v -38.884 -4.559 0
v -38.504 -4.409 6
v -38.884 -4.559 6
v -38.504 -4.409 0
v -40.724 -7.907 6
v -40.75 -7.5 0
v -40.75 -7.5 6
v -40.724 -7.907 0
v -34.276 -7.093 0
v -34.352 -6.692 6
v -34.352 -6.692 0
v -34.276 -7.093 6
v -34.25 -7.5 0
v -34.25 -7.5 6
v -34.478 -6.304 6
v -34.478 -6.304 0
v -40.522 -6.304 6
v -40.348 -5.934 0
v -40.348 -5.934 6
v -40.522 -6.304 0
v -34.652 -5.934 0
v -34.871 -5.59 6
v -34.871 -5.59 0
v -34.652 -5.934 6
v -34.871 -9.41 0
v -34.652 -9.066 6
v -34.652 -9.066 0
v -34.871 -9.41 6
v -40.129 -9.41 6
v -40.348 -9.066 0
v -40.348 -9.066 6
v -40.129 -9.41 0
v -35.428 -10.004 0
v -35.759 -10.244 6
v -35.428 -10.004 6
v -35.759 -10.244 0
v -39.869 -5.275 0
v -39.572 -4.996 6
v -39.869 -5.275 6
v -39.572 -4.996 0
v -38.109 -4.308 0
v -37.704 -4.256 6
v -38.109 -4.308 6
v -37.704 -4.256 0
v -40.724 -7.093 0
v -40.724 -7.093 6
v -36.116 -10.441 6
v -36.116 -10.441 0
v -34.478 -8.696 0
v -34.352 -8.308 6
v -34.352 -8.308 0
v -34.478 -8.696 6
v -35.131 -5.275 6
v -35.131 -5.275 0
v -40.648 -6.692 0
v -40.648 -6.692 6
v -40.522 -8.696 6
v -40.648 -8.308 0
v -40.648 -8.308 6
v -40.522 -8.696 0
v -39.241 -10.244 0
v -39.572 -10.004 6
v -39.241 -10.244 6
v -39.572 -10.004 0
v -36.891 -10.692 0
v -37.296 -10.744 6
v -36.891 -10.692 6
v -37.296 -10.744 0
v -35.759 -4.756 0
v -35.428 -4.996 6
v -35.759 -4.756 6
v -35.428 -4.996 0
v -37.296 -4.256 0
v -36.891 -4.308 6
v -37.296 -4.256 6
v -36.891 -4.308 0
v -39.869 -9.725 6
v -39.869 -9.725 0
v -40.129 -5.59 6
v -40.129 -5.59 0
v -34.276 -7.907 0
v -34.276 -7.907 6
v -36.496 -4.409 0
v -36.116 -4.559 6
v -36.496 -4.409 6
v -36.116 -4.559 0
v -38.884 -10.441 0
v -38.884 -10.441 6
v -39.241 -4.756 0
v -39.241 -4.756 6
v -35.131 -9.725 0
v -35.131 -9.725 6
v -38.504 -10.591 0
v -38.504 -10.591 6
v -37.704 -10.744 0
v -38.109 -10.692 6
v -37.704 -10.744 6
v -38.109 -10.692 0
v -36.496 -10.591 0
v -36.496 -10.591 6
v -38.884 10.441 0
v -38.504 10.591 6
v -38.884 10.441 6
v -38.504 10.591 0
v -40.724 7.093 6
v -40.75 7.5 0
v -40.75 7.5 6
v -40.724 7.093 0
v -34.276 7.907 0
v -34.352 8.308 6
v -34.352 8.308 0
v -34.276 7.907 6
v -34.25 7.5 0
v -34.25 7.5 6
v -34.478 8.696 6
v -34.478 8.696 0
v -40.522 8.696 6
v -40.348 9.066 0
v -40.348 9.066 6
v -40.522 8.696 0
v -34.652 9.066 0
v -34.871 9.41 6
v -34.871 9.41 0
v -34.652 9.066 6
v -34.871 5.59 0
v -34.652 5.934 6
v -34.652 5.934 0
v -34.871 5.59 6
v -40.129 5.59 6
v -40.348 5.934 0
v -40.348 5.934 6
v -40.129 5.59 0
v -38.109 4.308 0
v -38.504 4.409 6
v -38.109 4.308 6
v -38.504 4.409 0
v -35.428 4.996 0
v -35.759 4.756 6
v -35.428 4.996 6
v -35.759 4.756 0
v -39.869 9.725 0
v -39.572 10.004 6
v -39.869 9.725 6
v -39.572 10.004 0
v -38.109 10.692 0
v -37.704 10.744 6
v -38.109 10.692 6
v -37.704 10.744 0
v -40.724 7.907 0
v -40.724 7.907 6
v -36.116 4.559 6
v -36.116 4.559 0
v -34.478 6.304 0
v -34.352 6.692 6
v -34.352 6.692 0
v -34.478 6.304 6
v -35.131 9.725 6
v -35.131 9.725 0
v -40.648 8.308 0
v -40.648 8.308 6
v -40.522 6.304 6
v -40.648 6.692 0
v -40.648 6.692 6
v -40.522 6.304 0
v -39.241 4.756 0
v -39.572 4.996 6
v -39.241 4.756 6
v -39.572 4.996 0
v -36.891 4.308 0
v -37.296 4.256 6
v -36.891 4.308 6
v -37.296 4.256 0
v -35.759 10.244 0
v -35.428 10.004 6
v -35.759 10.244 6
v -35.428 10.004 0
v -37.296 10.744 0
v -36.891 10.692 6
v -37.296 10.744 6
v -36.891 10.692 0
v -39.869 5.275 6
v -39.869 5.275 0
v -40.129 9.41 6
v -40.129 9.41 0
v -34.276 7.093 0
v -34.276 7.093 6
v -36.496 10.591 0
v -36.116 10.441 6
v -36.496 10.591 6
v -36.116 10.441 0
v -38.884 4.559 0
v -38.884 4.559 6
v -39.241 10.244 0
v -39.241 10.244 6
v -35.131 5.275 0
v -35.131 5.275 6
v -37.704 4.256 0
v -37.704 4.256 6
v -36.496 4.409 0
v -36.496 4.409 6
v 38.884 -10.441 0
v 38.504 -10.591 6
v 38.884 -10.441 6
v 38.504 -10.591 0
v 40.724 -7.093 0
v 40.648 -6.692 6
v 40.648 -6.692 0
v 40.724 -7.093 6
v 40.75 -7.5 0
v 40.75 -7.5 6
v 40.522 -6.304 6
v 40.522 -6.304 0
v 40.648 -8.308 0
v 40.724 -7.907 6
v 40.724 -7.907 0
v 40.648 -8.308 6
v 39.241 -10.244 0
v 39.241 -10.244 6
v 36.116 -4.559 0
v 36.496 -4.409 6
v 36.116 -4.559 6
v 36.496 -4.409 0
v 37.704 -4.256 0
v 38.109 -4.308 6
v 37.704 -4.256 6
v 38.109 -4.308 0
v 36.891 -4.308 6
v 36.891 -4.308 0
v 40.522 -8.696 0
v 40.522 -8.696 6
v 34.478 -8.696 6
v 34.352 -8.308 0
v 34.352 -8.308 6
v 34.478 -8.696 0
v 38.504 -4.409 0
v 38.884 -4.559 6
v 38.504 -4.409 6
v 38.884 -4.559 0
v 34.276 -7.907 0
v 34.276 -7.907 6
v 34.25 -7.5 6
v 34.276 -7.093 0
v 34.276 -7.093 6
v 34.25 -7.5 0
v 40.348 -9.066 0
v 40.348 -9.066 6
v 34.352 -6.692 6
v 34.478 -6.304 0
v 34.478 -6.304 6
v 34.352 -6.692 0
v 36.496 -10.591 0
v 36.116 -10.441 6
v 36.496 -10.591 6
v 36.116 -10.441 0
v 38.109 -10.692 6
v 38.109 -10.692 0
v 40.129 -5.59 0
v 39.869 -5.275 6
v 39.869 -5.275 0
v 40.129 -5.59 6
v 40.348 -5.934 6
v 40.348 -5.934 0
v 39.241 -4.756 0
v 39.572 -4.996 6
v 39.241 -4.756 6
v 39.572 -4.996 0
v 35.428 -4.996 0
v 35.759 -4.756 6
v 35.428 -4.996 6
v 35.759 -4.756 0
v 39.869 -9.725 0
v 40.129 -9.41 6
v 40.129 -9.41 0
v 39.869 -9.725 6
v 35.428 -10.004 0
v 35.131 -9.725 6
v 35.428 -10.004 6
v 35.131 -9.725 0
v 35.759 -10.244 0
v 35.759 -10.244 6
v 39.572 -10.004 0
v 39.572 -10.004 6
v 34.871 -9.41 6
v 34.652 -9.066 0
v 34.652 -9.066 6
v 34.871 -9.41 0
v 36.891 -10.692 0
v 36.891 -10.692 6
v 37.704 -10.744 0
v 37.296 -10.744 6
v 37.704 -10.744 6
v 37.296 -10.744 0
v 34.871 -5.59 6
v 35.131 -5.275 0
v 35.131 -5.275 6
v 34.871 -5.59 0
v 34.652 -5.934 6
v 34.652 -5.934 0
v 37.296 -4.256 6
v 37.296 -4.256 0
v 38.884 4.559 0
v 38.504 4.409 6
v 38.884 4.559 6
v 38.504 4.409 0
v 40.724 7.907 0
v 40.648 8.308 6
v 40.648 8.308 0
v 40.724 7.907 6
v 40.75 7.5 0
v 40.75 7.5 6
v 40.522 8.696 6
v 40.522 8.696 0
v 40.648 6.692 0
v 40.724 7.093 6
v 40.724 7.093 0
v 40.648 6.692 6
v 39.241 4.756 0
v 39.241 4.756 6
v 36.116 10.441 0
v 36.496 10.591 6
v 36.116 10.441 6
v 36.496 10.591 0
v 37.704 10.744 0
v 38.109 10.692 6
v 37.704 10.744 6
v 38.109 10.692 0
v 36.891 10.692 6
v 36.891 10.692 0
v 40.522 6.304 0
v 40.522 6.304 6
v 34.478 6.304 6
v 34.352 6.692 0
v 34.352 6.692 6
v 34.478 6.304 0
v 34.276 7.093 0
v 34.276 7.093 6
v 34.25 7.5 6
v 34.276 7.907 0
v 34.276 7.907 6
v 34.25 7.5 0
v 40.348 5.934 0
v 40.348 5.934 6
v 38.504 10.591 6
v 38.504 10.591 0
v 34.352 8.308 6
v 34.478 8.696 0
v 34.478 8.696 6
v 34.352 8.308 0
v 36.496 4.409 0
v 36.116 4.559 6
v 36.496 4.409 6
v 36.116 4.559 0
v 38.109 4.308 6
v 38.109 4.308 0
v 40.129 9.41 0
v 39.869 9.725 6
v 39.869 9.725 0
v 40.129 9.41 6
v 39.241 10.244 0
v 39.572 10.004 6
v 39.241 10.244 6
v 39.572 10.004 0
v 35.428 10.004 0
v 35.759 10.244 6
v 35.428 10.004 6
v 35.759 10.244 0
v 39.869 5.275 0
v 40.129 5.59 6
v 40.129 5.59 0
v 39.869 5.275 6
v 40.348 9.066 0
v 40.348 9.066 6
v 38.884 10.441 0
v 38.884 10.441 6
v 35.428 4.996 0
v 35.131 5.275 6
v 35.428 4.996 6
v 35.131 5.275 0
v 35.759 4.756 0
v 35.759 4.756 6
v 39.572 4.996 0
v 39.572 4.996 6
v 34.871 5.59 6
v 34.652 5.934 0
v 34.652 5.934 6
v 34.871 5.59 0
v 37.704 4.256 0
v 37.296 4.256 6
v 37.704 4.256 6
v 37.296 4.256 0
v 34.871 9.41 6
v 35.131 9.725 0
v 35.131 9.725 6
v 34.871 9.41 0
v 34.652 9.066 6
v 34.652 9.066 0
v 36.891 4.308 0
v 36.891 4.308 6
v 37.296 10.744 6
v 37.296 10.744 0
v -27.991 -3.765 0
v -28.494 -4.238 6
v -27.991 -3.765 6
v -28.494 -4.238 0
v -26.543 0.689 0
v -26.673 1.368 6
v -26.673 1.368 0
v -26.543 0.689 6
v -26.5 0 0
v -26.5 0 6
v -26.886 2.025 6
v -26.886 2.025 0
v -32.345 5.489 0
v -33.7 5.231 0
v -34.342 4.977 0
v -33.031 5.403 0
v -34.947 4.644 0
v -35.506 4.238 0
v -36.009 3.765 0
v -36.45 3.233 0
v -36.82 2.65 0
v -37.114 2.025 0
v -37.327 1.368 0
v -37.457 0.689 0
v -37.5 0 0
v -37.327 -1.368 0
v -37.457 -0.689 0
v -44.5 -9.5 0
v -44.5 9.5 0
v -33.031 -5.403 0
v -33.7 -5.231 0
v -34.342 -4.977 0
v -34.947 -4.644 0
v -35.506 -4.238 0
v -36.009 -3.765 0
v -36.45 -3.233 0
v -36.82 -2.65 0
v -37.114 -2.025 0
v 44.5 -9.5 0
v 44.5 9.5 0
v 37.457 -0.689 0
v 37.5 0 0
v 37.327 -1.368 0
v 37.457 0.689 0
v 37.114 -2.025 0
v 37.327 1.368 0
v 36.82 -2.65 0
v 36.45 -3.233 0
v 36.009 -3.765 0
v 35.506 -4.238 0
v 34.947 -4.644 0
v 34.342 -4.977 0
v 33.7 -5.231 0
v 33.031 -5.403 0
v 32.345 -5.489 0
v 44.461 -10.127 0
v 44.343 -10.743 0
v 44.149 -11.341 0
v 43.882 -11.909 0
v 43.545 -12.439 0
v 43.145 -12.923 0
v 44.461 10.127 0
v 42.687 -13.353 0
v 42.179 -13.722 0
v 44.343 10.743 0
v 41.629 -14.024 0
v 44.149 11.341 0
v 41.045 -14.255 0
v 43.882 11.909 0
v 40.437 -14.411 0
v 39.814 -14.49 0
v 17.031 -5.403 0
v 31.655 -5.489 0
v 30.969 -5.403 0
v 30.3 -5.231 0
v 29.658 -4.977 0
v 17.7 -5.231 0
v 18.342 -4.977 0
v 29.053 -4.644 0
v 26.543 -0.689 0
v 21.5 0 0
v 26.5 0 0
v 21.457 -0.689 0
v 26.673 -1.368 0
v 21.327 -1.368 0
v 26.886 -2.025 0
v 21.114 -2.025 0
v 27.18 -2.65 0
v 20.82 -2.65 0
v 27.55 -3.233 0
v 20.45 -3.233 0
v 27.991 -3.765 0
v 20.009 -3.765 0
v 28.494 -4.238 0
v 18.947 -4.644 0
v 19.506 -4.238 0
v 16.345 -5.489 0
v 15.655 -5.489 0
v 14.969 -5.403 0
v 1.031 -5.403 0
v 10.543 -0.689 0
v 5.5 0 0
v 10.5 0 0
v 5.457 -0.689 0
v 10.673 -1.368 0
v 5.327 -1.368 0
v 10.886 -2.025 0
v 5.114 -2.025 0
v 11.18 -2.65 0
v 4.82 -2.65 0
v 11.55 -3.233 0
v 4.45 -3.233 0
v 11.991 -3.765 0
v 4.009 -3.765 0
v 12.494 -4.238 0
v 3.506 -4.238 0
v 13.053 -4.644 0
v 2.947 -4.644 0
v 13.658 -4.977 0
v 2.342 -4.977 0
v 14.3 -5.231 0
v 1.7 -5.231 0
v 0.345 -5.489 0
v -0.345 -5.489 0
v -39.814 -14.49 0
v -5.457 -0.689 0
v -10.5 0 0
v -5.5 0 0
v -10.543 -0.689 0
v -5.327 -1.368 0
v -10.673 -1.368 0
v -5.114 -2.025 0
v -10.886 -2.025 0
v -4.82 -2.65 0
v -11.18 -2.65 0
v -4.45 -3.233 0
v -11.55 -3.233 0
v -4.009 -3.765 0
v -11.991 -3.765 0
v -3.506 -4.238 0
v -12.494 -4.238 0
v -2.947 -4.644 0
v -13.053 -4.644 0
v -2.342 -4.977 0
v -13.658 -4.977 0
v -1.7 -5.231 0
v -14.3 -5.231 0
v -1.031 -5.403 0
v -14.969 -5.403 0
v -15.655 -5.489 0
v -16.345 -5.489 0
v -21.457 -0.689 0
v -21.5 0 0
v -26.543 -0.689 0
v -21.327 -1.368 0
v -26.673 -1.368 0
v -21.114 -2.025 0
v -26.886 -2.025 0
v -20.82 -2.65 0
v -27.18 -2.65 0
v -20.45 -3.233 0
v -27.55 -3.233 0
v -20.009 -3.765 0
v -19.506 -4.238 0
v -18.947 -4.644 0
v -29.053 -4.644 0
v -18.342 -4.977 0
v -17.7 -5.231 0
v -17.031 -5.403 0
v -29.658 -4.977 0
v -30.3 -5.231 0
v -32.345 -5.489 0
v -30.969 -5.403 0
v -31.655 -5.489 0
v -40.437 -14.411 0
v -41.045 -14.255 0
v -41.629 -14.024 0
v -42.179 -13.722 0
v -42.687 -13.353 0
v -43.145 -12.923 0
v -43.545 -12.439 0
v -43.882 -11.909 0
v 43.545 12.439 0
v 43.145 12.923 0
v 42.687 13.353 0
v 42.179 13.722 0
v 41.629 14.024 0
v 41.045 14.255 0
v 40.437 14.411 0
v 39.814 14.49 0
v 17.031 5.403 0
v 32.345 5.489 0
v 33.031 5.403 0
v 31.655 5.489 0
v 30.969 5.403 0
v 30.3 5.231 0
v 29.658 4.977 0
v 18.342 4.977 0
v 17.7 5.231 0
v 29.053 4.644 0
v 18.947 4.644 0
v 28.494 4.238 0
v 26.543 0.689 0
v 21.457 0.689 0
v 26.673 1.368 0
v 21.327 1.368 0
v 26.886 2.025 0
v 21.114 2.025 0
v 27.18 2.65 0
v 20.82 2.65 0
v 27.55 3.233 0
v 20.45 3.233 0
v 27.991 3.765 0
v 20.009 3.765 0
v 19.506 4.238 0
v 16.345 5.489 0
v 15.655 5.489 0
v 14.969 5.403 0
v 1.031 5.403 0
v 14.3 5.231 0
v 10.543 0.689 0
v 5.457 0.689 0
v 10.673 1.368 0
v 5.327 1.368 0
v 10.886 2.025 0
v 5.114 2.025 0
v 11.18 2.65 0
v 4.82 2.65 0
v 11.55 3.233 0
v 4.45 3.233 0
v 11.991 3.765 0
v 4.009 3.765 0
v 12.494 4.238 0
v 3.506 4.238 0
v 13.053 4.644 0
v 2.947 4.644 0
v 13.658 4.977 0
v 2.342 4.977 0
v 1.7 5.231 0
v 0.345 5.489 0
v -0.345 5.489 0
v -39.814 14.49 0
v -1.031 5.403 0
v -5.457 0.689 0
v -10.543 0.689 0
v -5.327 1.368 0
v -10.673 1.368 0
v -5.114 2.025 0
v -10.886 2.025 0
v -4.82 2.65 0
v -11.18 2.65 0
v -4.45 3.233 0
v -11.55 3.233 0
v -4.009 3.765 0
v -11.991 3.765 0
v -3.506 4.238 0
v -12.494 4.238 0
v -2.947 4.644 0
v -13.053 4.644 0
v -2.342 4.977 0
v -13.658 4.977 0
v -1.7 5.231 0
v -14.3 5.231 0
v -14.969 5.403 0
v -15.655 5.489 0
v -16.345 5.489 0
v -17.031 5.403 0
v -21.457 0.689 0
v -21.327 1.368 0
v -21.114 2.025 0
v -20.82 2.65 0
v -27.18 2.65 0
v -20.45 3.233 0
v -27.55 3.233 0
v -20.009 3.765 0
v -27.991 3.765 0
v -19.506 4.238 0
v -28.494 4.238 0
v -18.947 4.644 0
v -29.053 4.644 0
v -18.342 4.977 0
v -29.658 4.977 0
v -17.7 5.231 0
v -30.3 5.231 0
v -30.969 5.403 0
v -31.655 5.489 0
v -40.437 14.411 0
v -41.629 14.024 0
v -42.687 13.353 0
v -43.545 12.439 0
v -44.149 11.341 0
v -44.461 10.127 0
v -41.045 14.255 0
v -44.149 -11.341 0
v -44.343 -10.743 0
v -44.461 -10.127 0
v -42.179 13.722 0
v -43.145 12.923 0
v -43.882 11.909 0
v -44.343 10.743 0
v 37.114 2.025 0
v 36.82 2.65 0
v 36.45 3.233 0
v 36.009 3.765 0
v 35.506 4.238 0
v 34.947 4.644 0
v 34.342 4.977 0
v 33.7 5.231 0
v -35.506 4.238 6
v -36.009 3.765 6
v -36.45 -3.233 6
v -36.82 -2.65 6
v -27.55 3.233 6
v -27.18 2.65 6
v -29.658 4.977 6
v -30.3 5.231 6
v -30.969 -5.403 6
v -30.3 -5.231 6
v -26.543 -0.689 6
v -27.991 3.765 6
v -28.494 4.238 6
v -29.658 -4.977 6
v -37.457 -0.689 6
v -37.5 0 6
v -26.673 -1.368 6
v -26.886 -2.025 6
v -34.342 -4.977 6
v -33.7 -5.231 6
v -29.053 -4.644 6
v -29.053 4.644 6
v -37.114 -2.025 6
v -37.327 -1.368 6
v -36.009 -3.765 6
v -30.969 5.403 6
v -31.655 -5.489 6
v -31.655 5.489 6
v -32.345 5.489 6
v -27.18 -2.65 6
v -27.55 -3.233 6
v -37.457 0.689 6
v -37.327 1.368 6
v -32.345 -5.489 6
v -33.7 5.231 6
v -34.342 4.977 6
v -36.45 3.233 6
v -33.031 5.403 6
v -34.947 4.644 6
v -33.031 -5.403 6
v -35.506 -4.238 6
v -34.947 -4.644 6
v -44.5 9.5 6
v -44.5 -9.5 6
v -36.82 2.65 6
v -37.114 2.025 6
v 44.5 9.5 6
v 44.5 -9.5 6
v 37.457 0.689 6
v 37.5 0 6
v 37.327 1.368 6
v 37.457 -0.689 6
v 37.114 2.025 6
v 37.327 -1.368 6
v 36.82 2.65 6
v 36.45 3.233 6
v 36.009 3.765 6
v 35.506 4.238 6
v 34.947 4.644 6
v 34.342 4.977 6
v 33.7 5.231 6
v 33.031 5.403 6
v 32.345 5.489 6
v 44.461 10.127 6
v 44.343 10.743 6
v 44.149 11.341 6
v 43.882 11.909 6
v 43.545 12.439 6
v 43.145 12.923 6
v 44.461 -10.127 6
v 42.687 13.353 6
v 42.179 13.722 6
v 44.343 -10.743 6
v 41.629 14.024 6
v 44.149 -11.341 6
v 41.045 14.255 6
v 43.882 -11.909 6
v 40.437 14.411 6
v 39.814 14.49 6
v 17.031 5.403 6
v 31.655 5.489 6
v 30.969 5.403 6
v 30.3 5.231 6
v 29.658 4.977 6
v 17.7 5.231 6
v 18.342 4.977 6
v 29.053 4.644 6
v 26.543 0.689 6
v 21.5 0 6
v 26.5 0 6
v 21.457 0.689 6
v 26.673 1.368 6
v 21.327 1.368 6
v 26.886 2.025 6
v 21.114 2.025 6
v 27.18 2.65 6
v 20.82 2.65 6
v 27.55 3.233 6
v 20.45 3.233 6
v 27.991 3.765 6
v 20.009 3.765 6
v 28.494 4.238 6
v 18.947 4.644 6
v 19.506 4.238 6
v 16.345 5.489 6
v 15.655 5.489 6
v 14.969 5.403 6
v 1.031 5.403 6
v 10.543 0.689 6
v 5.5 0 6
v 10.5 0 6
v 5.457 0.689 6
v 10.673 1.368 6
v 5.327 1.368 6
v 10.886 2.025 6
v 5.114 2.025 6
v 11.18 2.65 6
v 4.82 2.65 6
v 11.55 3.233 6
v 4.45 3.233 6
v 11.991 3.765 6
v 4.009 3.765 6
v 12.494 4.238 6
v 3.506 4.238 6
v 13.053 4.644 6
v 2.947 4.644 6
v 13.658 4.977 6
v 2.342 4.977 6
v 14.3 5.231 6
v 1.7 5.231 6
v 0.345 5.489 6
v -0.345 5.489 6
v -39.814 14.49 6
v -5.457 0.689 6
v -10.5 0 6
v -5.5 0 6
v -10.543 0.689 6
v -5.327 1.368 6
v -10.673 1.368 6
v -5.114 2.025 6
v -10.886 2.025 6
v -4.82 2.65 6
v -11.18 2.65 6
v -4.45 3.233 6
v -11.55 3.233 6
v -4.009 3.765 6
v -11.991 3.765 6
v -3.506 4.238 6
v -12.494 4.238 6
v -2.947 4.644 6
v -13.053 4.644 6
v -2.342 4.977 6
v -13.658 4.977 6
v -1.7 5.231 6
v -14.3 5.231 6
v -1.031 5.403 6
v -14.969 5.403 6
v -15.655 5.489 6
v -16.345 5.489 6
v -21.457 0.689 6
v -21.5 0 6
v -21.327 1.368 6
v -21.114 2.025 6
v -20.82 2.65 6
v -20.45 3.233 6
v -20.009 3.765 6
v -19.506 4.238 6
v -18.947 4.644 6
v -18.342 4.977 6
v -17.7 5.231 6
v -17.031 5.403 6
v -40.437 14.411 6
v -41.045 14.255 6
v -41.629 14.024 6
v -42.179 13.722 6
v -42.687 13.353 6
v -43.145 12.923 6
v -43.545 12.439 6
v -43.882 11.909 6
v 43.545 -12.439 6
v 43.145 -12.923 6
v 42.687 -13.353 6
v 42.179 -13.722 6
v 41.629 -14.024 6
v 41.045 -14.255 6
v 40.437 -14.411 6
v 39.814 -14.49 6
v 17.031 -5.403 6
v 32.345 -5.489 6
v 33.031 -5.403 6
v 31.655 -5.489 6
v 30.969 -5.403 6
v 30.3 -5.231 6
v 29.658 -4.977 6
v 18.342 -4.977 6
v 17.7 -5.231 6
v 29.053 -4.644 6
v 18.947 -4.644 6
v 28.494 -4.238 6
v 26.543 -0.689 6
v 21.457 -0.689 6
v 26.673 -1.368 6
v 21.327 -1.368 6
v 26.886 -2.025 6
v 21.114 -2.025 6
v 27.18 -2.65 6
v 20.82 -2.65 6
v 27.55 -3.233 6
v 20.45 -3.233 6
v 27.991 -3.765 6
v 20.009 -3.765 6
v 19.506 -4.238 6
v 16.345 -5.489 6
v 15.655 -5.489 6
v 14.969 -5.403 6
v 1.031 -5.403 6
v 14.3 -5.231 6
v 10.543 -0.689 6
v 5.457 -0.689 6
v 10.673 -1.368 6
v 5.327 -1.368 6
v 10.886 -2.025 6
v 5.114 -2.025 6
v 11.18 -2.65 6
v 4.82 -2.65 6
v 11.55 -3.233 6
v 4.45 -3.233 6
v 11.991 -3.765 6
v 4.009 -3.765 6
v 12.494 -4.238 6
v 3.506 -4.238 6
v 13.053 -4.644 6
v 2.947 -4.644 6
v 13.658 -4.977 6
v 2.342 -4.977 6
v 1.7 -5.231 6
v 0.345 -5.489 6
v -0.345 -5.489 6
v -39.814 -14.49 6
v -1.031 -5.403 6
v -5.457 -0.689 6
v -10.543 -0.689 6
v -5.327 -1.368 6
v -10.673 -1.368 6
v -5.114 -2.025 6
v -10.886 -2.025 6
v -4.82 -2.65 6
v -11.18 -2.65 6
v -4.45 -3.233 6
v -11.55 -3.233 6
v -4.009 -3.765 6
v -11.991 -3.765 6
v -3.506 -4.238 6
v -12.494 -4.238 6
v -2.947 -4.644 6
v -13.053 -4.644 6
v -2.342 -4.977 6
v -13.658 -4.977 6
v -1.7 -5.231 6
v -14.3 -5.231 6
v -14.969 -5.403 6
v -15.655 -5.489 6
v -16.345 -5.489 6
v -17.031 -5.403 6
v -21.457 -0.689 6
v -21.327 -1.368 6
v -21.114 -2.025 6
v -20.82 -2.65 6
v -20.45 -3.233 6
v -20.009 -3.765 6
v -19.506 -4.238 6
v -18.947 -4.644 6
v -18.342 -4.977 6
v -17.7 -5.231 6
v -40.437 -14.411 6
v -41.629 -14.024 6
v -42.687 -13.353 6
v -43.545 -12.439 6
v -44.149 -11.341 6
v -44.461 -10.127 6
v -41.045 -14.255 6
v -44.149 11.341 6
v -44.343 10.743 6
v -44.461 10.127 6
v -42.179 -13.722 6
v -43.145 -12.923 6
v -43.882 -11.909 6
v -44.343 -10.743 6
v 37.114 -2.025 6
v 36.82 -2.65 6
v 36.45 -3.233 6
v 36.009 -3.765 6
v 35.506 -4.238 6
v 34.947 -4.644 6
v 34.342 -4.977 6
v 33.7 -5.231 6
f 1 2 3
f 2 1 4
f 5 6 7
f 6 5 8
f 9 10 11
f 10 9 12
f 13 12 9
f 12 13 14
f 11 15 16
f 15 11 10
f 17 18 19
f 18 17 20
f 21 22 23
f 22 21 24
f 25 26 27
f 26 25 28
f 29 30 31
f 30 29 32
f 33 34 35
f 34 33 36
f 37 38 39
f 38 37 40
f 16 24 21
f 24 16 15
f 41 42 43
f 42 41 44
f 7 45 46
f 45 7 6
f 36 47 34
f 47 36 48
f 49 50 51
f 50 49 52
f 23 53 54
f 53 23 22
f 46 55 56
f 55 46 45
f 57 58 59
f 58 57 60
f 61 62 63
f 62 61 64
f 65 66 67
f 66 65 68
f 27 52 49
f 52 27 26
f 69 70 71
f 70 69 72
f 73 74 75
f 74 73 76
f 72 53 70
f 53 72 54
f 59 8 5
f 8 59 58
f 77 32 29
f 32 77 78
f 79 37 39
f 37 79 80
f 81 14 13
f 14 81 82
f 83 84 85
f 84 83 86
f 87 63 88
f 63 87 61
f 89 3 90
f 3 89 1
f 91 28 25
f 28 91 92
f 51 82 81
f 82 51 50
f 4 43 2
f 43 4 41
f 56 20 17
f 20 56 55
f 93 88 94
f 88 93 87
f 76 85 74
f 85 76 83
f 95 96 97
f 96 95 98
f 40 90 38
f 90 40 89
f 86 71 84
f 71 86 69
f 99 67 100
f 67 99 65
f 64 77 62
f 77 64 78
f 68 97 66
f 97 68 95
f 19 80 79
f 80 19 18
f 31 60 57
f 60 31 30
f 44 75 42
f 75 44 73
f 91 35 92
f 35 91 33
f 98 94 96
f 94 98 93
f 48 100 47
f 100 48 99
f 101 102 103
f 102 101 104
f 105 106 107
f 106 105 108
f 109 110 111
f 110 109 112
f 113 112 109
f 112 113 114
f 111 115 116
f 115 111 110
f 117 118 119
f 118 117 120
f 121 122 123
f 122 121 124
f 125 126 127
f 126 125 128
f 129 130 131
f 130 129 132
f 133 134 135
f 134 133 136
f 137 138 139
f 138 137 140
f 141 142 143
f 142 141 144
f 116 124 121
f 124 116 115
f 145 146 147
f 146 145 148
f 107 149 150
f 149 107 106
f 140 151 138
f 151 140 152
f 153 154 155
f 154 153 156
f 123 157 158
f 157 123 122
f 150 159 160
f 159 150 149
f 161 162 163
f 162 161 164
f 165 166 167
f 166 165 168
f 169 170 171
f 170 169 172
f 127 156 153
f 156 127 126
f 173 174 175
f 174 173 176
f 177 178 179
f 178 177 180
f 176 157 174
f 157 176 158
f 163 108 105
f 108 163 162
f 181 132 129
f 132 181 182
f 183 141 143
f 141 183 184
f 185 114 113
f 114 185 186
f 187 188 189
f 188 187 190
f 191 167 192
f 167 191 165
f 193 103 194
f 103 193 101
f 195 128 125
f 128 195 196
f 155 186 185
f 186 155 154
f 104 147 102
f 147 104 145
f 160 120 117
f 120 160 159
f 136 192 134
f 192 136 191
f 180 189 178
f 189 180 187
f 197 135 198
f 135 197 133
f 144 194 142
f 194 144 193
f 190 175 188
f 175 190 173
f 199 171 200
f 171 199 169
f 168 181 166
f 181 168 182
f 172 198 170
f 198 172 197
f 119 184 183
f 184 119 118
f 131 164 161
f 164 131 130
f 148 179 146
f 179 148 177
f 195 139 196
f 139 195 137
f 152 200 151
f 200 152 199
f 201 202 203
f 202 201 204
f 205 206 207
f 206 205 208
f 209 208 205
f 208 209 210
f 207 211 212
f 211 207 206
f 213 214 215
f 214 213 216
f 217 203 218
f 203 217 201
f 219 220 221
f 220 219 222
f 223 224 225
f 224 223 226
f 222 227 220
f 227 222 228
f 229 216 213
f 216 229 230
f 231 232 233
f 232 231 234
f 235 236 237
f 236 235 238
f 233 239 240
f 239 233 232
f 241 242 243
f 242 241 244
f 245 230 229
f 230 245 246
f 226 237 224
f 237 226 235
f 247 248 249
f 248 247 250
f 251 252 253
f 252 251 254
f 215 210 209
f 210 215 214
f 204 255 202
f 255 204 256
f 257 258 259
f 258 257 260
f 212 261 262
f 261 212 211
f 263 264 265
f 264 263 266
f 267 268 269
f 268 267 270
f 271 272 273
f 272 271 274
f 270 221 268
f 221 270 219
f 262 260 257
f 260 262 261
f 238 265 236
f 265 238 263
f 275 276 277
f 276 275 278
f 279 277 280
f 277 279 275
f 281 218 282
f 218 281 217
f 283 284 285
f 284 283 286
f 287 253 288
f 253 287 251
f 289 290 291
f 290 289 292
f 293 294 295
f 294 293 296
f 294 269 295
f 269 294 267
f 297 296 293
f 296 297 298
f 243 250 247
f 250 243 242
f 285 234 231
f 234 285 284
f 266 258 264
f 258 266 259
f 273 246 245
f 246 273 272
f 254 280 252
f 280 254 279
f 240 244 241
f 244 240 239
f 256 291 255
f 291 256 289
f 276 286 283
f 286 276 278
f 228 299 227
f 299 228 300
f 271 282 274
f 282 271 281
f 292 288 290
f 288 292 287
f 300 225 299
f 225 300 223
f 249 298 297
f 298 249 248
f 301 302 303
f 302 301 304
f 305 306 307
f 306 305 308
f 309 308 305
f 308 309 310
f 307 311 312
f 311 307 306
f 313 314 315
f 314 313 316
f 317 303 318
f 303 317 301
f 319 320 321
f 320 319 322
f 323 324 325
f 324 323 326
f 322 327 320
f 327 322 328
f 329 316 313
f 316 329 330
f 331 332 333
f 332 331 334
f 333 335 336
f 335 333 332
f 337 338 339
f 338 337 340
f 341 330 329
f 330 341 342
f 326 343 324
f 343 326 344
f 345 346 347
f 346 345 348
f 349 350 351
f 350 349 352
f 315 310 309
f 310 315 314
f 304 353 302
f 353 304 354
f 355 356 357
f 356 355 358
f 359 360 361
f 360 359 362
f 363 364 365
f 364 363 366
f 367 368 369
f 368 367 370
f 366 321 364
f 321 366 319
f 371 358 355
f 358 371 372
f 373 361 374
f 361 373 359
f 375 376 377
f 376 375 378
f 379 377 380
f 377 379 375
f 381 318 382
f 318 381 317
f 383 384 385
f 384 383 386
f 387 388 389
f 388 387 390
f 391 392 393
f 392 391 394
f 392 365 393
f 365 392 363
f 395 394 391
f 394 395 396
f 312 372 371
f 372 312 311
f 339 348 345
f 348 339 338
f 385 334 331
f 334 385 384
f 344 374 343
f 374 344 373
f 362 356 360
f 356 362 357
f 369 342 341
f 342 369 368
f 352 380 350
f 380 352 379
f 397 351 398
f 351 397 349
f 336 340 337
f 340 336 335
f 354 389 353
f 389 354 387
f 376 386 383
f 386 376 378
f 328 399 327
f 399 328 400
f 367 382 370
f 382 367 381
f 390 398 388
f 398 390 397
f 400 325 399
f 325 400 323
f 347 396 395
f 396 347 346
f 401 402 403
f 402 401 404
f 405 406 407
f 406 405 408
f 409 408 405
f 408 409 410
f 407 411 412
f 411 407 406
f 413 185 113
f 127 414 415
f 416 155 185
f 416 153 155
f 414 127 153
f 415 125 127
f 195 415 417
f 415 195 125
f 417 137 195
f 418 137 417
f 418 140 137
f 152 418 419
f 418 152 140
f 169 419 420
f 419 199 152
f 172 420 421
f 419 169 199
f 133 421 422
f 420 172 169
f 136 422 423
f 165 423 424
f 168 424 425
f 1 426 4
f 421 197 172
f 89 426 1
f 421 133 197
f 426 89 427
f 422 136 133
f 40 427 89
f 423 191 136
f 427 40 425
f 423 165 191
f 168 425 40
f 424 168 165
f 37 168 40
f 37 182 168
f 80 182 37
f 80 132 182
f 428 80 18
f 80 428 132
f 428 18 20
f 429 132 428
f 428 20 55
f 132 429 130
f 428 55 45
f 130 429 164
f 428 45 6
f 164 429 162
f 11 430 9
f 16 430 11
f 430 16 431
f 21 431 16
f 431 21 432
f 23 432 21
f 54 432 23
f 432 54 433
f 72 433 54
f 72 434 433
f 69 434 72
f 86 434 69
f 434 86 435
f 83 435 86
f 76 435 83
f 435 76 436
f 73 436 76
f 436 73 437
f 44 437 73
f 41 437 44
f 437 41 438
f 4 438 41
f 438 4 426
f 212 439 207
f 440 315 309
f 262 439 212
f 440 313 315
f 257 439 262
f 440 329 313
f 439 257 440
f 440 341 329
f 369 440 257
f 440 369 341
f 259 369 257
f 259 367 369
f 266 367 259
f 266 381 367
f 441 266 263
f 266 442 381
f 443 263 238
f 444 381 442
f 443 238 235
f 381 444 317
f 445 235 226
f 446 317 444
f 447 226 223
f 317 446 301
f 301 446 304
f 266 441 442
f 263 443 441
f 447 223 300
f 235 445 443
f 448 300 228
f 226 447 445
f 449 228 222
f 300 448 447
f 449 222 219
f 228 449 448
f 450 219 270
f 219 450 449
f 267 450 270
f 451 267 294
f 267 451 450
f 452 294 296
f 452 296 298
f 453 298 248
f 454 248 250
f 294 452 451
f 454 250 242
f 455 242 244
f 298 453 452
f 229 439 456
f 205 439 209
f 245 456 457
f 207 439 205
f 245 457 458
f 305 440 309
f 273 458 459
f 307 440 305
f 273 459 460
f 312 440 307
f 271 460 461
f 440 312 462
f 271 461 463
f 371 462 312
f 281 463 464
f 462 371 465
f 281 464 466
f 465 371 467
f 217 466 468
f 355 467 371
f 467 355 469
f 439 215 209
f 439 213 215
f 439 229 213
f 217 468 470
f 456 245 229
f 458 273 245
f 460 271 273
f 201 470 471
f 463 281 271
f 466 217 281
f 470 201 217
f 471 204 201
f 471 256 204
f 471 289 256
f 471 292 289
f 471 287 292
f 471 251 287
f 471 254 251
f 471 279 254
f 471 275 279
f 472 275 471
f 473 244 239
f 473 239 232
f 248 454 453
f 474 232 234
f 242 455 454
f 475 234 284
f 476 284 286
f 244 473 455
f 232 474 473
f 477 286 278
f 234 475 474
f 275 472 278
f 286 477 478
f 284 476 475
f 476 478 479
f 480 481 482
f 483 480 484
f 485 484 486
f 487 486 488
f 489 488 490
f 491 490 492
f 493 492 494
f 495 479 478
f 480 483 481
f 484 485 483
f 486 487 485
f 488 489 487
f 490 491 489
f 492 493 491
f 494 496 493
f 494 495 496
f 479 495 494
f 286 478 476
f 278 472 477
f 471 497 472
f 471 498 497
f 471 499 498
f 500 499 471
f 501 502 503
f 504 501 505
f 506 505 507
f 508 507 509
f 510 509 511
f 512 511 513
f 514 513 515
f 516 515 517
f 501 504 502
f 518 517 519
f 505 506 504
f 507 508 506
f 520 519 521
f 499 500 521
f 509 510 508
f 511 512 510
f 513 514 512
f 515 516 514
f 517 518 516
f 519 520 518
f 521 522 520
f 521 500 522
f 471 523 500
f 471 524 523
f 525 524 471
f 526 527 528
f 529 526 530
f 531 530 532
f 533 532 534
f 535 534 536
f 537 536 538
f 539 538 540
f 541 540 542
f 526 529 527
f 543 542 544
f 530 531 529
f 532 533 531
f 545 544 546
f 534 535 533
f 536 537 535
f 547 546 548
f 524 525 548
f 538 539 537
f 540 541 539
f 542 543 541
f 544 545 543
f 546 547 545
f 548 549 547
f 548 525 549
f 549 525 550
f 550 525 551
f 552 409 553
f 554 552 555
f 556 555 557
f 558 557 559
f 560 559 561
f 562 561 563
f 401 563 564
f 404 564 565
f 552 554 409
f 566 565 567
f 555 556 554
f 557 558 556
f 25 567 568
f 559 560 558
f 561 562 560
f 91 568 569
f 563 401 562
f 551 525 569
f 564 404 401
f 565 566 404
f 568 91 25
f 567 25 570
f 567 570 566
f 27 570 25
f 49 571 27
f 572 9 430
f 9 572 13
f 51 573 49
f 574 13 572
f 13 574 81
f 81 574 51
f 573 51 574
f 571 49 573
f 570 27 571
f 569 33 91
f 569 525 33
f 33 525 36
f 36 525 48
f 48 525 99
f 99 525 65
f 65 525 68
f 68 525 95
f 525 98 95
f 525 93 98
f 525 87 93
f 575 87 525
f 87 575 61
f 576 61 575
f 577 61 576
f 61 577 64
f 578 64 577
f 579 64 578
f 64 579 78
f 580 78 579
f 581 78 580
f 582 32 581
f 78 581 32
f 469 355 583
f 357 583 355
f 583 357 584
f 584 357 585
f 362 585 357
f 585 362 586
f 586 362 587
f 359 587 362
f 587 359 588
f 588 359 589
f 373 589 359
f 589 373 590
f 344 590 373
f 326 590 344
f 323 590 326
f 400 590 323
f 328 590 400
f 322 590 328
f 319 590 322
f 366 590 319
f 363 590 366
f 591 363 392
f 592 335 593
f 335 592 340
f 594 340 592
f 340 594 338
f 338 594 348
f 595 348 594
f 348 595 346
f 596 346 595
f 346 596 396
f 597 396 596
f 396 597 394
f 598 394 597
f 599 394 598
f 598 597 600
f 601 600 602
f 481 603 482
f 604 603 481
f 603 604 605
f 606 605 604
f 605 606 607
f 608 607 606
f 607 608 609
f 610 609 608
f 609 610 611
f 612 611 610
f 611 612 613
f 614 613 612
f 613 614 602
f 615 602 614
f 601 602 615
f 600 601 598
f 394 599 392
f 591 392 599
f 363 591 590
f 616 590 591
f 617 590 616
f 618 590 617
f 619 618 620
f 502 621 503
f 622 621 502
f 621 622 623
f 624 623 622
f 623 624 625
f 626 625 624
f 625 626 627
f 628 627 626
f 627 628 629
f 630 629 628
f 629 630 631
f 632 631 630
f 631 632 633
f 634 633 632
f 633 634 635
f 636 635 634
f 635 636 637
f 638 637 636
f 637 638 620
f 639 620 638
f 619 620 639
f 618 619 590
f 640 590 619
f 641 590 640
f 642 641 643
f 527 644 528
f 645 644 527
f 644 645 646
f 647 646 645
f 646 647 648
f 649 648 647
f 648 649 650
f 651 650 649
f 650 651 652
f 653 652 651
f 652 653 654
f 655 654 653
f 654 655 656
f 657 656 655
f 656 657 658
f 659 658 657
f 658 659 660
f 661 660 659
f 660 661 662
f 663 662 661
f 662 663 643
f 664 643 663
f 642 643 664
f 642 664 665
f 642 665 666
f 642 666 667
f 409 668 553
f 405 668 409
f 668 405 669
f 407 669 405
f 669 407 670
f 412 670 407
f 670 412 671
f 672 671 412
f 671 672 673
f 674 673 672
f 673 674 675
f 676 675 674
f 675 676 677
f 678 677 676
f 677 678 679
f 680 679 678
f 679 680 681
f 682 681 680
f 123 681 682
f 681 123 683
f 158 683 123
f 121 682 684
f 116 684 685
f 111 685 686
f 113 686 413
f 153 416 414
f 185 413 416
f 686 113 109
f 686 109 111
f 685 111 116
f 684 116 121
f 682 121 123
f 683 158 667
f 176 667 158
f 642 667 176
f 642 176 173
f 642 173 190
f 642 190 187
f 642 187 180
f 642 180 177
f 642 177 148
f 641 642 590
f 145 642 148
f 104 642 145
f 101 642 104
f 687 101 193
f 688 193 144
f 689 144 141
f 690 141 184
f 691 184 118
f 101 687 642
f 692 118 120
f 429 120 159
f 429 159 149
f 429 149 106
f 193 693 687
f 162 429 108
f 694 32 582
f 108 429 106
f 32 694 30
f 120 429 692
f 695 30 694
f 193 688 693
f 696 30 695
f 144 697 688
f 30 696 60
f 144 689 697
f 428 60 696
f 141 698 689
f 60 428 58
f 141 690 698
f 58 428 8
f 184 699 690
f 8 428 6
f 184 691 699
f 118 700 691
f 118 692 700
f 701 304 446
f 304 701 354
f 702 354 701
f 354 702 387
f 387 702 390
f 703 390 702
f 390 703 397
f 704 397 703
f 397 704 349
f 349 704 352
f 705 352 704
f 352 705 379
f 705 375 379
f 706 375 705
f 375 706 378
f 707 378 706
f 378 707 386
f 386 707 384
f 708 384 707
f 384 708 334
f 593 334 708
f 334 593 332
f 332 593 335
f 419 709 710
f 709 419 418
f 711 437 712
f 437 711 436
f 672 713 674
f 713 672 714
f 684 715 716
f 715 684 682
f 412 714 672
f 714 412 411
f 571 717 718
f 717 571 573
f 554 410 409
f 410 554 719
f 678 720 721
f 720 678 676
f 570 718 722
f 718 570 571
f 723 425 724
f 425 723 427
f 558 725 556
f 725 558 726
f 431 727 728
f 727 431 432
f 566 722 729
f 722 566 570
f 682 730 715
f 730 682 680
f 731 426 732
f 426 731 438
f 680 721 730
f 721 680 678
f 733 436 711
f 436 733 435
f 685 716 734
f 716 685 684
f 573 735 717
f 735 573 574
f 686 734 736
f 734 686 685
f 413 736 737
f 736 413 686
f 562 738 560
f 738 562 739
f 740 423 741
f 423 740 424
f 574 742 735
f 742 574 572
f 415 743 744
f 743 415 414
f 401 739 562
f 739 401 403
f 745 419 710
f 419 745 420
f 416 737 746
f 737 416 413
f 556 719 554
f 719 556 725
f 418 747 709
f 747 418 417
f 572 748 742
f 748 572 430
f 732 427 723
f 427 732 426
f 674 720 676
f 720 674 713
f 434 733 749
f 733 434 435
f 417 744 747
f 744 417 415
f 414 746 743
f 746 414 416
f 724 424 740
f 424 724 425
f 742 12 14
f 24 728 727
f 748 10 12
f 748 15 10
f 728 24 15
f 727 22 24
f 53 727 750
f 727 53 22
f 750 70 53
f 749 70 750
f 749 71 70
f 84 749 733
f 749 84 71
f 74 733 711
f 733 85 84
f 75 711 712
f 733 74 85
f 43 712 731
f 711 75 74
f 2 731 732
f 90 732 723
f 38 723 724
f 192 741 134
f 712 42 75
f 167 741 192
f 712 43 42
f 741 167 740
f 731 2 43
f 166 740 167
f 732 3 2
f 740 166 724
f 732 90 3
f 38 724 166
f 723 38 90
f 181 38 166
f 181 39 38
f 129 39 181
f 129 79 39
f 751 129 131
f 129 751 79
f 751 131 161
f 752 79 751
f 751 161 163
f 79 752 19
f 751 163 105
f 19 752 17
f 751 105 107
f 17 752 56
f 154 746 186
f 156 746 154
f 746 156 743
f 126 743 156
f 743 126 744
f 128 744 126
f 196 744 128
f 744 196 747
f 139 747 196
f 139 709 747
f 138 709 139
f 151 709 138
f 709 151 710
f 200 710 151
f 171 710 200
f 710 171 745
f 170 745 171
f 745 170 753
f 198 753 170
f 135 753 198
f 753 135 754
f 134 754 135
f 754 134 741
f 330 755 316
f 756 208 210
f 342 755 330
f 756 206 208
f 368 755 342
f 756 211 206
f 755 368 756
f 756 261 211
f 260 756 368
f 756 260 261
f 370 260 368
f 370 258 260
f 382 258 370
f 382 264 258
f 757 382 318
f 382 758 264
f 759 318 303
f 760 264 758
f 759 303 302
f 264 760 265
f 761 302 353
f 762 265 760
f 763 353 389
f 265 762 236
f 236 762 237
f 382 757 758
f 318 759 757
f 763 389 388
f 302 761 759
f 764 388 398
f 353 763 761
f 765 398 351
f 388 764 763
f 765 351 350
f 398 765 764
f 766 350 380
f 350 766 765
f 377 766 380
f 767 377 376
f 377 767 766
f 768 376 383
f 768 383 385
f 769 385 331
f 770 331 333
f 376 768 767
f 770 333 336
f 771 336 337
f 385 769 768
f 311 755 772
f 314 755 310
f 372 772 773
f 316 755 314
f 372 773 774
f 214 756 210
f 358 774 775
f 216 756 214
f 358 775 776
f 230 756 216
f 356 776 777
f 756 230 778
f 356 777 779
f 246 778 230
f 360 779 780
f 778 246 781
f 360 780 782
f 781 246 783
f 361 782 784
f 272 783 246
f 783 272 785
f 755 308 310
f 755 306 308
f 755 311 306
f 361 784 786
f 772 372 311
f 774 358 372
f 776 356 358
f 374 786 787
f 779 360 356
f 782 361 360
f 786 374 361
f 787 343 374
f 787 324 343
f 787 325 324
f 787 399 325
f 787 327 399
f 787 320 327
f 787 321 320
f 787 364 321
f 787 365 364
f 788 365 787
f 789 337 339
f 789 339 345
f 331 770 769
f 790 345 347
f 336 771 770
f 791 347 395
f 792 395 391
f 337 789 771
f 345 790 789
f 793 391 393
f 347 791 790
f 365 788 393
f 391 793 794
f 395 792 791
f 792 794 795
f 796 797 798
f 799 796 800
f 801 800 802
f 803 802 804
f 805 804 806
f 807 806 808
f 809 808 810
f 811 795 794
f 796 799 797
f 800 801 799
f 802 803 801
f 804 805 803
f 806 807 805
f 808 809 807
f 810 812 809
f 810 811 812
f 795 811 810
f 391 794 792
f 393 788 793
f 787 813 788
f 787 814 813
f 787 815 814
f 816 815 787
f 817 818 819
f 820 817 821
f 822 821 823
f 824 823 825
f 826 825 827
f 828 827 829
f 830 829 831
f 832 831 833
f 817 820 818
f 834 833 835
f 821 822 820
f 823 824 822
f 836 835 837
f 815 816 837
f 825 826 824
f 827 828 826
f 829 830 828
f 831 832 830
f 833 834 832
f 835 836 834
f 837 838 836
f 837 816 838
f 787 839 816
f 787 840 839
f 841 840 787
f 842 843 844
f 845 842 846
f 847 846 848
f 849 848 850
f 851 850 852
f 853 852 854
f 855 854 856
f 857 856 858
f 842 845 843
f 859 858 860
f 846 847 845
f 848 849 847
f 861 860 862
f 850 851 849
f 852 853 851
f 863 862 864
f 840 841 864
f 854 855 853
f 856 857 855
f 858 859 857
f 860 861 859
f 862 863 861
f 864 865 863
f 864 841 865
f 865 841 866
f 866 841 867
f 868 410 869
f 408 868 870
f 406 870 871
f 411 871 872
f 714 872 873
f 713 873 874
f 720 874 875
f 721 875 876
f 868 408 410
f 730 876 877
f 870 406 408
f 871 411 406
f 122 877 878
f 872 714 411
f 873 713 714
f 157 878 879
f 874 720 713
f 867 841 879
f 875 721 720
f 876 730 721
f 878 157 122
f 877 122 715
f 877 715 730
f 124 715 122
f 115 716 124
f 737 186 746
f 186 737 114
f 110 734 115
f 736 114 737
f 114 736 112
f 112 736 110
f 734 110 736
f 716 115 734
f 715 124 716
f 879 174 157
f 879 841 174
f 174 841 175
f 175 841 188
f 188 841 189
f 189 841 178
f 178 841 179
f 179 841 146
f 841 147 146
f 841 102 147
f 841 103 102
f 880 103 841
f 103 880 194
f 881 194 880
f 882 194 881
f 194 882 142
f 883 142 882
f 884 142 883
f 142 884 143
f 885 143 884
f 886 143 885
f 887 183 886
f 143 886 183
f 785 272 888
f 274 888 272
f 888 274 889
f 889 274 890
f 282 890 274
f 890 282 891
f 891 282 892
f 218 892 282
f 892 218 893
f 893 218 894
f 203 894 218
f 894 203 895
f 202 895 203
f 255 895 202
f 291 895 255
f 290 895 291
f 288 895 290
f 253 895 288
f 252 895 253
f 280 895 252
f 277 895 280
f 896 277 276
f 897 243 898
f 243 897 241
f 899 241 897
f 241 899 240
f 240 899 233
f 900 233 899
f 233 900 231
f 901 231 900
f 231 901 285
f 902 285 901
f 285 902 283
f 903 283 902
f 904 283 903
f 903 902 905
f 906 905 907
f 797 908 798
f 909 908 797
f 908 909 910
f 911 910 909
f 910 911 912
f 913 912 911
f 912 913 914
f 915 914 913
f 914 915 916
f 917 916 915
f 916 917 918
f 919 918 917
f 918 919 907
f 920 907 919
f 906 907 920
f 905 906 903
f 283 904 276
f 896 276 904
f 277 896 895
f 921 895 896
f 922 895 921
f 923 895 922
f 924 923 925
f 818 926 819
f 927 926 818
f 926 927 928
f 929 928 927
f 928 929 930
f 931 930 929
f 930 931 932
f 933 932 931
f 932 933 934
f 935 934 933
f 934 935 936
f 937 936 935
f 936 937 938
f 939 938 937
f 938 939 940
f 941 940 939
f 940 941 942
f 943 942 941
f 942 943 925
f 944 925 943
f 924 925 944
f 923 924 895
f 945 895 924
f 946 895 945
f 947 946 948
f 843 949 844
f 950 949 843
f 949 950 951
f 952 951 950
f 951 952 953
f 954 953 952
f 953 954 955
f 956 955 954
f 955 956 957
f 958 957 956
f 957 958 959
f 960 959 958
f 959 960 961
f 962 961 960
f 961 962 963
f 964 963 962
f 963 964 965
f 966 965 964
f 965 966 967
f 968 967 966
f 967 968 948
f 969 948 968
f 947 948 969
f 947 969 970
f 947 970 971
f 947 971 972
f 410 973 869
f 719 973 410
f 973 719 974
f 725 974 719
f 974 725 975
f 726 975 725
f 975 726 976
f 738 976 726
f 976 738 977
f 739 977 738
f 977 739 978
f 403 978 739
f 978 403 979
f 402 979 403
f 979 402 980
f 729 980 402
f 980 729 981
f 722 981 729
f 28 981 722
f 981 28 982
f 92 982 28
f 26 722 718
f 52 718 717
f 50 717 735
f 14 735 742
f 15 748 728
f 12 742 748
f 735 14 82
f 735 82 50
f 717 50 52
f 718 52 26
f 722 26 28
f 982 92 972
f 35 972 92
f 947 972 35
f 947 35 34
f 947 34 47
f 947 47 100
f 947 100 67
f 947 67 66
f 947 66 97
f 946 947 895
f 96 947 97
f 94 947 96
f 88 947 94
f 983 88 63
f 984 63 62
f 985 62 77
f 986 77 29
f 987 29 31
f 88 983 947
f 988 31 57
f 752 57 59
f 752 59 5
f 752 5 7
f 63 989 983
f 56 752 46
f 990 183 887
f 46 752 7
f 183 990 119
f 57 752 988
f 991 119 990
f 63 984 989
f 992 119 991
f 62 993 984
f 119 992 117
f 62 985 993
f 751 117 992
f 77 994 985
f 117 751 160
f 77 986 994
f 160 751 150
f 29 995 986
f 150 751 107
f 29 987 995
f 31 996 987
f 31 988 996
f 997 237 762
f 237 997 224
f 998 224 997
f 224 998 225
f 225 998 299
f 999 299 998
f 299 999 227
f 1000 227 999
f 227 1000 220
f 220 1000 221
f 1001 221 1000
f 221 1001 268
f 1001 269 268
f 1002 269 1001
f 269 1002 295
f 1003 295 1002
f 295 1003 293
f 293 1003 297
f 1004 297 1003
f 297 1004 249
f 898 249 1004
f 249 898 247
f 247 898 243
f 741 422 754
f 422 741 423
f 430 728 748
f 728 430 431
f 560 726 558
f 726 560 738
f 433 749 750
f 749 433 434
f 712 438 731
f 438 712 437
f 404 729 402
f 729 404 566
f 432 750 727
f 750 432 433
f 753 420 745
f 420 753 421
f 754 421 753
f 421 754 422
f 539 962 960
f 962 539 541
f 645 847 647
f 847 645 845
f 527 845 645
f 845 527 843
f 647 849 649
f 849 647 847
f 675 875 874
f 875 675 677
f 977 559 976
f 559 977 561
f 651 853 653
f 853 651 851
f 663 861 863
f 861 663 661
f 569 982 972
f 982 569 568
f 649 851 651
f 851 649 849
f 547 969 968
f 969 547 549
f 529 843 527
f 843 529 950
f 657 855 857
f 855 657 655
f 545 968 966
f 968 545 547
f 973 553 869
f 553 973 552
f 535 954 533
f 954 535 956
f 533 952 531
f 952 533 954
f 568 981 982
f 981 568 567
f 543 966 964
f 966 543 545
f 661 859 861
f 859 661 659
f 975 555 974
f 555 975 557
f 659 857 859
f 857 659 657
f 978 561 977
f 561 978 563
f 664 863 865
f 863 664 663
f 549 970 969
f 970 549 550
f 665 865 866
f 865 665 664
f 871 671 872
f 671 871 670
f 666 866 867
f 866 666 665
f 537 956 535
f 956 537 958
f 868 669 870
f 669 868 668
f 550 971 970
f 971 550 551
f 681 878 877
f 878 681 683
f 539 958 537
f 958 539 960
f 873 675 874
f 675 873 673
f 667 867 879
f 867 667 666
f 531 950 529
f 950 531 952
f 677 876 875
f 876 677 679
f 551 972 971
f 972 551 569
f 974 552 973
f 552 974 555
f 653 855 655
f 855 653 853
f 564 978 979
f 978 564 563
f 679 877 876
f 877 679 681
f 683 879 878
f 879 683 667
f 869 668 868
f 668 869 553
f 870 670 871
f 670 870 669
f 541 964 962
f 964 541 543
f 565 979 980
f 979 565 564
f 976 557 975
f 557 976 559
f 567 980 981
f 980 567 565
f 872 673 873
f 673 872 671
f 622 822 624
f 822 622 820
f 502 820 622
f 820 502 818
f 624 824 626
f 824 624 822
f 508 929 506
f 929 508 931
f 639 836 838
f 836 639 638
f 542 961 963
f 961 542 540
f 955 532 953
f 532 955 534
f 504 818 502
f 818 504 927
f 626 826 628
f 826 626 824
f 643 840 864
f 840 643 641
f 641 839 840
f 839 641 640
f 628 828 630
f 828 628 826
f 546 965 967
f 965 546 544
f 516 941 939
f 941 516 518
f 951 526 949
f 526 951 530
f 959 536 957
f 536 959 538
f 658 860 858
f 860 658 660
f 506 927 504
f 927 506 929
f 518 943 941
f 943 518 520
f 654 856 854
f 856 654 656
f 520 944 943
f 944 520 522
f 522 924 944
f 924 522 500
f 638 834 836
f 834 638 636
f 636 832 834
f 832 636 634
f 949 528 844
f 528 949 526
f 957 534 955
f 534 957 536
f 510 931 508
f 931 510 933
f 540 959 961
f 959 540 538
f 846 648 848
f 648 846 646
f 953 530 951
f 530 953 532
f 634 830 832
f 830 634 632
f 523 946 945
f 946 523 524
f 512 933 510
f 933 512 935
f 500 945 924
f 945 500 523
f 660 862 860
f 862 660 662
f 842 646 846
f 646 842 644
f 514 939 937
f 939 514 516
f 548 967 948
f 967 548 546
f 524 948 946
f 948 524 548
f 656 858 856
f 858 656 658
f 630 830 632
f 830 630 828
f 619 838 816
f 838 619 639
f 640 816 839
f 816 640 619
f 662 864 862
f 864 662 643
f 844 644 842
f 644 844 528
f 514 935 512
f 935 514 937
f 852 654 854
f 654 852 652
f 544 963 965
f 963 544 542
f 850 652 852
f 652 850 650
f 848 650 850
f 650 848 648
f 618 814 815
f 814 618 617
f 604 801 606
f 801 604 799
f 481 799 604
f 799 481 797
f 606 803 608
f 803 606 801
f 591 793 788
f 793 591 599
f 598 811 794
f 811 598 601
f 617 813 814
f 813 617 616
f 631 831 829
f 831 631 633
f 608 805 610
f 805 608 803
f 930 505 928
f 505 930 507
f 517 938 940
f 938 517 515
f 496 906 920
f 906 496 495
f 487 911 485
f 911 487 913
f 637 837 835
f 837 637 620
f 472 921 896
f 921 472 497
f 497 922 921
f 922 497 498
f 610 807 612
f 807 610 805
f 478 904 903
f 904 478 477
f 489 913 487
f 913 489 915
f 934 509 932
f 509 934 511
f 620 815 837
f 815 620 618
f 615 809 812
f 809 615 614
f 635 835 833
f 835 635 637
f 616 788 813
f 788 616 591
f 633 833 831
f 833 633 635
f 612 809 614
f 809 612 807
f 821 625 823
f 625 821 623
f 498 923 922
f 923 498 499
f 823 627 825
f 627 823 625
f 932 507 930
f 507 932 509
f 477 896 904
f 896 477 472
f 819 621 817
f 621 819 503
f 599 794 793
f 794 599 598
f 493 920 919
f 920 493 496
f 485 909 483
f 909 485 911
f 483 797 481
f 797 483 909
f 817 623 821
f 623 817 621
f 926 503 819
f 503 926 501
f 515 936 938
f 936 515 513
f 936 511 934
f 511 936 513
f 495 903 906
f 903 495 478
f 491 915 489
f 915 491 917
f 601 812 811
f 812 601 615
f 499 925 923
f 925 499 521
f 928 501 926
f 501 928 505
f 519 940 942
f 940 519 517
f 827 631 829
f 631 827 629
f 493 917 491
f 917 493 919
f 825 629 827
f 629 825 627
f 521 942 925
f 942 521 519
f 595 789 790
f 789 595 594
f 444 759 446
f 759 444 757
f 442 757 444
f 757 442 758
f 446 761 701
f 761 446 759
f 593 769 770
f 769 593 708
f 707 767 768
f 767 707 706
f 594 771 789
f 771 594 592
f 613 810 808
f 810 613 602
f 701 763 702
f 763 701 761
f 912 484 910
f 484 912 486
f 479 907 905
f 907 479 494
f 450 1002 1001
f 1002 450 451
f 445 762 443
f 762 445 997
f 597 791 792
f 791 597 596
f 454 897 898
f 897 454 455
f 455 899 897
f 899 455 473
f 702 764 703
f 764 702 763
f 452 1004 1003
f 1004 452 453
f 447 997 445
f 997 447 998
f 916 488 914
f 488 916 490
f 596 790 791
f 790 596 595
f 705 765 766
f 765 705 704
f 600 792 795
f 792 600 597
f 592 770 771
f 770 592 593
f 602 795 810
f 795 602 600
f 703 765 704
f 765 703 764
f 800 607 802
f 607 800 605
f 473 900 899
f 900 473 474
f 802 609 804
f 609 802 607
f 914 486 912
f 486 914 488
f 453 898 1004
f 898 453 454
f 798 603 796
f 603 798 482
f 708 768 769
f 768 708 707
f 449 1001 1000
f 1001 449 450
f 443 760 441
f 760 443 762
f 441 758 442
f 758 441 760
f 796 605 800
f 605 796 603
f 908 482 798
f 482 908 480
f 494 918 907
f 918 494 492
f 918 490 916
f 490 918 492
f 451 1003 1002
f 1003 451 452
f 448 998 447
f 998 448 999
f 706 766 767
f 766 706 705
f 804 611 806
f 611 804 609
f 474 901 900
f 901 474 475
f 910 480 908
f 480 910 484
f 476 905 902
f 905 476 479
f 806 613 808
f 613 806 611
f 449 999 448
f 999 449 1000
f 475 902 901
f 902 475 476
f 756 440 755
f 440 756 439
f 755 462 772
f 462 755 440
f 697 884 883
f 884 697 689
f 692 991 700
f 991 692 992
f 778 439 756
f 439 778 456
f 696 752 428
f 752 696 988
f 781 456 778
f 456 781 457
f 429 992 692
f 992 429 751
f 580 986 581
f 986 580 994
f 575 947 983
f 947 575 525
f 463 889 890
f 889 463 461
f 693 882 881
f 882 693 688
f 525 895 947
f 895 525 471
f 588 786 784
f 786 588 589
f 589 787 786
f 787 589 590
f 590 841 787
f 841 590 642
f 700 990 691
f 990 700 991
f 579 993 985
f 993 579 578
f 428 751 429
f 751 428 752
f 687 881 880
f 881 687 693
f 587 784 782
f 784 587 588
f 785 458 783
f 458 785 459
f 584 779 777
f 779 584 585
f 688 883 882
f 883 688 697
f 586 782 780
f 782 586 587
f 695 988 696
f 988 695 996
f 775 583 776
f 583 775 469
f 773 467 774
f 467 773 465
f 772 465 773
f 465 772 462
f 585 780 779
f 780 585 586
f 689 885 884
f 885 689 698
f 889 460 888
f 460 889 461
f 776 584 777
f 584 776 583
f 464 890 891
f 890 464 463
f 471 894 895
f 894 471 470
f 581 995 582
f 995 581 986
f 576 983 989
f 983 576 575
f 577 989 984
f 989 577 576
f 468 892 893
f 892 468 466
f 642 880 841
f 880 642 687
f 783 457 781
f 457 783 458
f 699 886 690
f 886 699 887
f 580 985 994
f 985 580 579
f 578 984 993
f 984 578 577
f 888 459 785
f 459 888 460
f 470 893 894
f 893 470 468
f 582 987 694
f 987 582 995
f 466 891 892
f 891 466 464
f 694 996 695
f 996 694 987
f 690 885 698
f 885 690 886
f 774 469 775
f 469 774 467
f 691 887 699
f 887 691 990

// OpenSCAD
$fn = 50;


difference() {
	union() {
		hull() {
			translate(v = [-39.5000000000, 9.5000000000, 0]) {
				cylinder(h = 6, r = 5);
			}
			translate(v = [39.5000000000, 9.5000000000, 0]) {
				cylinder(h = 6, r = 5);
			}
			translate(v = [-39.5000000000, -9.5000000000, 0]) {
				cylinder(h = 6, r = 5);
			}
			translate(v = [39.5000000000, -9.5000000000, 0]) {
				cylinder(h = 6, r = 5);
			}
		}
	}
	union() {
		#translate(v = [-37.5000000000, -7.5000000000, -100.0000000000]) {
			cylinder(h = 200, r = 3.2500000000);
		}
		#translate(v = [-37.5000000000, 7.5000000000, -100.0000000000]) {
			cylinder(h = 200, r = 3.2500000000);
		}
		#translate(v = [37.5000000000, -7.5000000000, -100.0000000000]) {
			cylinder(h = 200, r = 3.2500000000);
		}
		#translate(v = [37.5000000000, 7.5000000000, -100.0000000000]) {
			cylinder(h = 200, r = 3.2500000000);
		}
		#translate(v = [-32.0000000000, 0, 0]) {
			cylinder(h = 6, r = 5.5000000000);
		}
		#translate(v = [-16.0000000000, 0, 0]) {
			cylinder(h = 6, r = 5.5000000000);
		}
		#cylinder(h = 6, r = 5.5000000000);
		#translate(v = [16.0000000000, 0, 0]) {
			cylinder(h = 6, r = 5.5000000000);
		}
		#translate(v = [32.0000000000, 0, 0]) {
			cylinder(h = 6, r = 5.5000000000);
		}
	}
}
